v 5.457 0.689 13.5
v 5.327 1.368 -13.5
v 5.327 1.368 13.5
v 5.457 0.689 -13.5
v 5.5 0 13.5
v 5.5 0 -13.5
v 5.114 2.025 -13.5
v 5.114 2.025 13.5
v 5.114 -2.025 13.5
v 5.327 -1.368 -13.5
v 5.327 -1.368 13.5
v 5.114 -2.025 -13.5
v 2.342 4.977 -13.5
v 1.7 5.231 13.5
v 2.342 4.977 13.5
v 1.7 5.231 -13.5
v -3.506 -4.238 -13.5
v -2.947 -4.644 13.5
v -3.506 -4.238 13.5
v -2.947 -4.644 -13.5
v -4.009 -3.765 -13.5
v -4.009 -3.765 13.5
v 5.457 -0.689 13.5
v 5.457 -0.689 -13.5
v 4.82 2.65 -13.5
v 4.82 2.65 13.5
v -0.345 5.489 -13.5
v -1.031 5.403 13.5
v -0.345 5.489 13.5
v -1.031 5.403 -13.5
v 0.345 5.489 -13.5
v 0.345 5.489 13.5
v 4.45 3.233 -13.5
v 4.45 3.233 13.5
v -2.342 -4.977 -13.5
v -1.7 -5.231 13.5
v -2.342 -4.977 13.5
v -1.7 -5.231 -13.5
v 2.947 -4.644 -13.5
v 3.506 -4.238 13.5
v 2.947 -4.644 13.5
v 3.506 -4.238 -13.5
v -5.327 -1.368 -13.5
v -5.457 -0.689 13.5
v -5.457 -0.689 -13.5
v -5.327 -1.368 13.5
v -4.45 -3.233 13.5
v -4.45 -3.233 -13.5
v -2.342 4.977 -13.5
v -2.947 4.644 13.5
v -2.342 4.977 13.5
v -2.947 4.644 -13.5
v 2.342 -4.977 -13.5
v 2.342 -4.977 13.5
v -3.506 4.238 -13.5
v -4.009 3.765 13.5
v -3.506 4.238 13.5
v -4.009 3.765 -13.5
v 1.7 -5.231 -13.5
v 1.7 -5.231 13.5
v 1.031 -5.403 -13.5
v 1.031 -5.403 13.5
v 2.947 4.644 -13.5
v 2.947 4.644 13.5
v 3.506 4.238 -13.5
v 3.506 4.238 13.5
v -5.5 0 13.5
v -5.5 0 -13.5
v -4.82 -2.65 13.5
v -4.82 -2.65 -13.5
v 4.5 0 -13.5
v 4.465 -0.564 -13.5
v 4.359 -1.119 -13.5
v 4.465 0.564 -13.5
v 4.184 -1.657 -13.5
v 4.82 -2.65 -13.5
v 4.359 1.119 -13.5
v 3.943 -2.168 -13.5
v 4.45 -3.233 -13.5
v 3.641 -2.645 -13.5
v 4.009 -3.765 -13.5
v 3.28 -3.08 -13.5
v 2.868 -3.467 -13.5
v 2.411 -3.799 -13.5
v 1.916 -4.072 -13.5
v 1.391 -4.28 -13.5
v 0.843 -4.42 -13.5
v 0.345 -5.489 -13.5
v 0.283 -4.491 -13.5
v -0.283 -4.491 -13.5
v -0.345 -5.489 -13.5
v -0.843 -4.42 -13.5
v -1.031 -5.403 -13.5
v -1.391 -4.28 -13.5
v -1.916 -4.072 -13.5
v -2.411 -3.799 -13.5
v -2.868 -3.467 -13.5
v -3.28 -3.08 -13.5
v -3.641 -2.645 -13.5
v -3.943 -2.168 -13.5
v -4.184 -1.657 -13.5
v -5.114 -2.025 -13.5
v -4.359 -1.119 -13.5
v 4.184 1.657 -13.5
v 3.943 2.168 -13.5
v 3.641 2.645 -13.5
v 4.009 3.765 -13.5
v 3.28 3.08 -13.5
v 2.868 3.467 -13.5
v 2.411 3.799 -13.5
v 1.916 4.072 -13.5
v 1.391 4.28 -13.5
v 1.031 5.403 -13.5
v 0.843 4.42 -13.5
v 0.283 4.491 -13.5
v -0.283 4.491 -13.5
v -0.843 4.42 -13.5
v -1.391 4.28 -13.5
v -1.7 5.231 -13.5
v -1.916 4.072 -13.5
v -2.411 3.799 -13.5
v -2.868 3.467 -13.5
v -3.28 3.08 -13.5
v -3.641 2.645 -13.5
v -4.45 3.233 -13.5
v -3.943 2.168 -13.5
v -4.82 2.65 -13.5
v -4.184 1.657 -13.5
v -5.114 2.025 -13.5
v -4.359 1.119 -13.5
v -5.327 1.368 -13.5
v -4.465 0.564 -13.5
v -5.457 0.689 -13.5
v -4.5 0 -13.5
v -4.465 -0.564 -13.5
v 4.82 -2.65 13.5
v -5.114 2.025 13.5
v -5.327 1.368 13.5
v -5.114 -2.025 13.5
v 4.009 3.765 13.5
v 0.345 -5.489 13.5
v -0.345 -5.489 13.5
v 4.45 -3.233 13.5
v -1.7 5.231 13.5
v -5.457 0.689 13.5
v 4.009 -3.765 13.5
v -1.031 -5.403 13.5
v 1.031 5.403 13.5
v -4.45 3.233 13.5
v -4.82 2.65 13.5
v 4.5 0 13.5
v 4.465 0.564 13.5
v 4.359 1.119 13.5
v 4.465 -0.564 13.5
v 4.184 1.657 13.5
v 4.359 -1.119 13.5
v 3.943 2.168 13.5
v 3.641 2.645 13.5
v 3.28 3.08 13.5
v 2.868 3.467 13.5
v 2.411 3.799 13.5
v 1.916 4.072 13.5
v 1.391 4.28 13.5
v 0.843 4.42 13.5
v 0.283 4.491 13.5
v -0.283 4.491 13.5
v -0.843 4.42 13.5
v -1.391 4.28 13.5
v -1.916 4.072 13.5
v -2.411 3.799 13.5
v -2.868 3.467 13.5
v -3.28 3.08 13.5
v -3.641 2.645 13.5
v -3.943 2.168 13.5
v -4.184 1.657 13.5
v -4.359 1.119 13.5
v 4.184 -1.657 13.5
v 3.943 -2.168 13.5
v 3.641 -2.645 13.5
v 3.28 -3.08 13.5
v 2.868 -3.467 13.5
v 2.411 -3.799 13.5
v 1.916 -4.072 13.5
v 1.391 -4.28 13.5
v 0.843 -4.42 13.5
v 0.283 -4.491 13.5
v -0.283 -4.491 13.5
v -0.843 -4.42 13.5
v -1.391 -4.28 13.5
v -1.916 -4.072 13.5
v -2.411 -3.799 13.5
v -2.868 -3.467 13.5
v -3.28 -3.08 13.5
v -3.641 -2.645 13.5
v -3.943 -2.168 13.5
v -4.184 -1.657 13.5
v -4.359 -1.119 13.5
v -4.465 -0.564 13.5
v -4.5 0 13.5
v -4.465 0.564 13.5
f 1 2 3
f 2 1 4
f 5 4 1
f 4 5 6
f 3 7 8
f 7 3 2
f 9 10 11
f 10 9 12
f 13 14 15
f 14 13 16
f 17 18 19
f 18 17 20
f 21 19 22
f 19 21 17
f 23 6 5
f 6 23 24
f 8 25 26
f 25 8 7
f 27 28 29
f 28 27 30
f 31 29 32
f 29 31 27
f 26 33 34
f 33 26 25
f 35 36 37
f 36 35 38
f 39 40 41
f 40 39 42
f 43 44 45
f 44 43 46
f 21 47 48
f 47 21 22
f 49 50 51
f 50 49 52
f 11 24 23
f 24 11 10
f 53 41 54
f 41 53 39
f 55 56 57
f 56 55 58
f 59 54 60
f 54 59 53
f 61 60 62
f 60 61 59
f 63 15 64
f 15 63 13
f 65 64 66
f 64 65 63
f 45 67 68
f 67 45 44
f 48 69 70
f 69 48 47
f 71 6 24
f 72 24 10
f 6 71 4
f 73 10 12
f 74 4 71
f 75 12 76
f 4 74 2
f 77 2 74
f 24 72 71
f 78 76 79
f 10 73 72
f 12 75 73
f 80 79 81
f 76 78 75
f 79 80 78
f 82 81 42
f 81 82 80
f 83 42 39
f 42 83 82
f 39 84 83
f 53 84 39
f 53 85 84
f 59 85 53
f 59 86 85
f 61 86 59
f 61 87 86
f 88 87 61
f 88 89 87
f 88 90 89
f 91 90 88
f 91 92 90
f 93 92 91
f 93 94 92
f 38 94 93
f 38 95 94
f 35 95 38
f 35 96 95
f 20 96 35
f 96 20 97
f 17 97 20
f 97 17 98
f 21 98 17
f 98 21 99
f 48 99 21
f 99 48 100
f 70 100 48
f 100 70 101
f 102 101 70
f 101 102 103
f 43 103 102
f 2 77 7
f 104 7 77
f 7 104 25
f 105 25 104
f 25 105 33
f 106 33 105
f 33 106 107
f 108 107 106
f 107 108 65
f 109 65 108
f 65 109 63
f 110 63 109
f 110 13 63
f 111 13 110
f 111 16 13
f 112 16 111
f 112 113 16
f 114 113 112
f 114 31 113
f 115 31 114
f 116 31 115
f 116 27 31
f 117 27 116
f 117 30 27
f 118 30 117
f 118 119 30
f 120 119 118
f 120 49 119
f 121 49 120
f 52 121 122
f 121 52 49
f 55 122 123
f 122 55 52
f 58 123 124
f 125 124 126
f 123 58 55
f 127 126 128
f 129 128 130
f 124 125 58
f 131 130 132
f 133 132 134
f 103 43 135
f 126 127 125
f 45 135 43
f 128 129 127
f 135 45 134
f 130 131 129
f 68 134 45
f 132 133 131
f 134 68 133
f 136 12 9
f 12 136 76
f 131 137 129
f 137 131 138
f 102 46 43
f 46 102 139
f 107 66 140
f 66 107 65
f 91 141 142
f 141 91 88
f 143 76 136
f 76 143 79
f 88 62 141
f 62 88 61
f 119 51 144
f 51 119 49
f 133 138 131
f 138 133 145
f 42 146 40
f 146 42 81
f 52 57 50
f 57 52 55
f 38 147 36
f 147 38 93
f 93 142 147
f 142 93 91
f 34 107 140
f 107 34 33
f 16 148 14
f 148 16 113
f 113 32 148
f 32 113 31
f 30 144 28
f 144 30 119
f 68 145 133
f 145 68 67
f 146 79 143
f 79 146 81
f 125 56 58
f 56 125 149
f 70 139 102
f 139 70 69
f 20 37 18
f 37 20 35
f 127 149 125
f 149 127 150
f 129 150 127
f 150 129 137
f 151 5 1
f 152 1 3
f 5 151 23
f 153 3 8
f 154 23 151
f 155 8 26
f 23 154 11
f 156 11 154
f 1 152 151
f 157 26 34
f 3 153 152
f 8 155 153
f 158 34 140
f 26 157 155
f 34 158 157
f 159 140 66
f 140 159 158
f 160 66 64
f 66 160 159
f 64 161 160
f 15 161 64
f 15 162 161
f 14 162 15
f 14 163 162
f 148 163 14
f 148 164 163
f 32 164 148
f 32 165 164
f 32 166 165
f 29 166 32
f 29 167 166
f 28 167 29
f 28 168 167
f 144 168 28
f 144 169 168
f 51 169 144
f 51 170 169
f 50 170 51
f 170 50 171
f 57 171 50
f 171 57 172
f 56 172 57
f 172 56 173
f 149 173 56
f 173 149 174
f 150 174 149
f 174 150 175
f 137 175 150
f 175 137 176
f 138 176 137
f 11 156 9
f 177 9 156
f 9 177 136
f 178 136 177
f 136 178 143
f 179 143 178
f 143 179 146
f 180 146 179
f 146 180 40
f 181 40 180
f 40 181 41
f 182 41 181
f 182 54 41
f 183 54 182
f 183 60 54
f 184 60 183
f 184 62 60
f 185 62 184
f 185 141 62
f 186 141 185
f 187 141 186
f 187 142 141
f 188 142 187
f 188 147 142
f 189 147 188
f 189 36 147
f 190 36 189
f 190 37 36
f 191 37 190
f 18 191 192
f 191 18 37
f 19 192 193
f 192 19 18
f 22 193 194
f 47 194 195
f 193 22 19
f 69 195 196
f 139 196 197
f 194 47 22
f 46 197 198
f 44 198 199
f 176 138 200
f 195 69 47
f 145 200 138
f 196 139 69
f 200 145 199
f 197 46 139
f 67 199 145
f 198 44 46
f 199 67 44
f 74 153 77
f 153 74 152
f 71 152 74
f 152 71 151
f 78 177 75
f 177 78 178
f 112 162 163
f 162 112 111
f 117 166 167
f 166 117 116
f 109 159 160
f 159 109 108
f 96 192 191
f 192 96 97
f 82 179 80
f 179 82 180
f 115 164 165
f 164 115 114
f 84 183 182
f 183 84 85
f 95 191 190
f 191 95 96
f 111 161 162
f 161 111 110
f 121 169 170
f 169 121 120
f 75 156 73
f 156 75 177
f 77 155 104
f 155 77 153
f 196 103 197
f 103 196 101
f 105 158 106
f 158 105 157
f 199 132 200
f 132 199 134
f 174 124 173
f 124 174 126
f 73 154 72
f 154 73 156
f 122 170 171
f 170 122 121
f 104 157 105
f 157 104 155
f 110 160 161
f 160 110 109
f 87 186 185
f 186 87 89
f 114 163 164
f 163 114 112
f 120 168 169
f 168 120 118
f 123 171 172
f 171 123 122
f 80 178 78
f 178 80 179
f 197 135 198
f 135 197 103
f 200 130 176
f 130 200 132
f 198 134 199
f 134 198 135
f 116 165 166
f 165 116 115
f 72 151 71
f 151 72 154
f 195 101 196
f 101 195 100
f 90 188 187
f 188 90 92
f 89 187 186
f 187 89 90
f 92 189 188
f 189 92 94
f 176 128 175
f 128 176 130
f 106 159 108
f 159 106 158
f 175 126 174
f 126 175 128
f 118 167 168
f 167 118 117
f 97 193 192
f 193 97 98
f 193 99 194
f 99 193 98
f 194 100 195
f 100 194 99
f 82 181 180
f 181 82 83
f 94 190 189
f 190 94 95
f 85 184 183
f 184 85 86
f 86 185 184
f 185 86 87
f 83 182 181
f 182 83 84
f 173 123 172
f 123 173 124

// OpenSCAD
$fn = 50;


difference() {
	union() {
		translate(v = [0, 0, -13.5000000000]) {
			cylinder(h = 27, r = 5.5000000000);
		}
	}
	union() {
		translate(v = [0, 0, -100.0000000000]) {
			cylinder(h = 200, r = 4.5000000000);
		}
	}
}
